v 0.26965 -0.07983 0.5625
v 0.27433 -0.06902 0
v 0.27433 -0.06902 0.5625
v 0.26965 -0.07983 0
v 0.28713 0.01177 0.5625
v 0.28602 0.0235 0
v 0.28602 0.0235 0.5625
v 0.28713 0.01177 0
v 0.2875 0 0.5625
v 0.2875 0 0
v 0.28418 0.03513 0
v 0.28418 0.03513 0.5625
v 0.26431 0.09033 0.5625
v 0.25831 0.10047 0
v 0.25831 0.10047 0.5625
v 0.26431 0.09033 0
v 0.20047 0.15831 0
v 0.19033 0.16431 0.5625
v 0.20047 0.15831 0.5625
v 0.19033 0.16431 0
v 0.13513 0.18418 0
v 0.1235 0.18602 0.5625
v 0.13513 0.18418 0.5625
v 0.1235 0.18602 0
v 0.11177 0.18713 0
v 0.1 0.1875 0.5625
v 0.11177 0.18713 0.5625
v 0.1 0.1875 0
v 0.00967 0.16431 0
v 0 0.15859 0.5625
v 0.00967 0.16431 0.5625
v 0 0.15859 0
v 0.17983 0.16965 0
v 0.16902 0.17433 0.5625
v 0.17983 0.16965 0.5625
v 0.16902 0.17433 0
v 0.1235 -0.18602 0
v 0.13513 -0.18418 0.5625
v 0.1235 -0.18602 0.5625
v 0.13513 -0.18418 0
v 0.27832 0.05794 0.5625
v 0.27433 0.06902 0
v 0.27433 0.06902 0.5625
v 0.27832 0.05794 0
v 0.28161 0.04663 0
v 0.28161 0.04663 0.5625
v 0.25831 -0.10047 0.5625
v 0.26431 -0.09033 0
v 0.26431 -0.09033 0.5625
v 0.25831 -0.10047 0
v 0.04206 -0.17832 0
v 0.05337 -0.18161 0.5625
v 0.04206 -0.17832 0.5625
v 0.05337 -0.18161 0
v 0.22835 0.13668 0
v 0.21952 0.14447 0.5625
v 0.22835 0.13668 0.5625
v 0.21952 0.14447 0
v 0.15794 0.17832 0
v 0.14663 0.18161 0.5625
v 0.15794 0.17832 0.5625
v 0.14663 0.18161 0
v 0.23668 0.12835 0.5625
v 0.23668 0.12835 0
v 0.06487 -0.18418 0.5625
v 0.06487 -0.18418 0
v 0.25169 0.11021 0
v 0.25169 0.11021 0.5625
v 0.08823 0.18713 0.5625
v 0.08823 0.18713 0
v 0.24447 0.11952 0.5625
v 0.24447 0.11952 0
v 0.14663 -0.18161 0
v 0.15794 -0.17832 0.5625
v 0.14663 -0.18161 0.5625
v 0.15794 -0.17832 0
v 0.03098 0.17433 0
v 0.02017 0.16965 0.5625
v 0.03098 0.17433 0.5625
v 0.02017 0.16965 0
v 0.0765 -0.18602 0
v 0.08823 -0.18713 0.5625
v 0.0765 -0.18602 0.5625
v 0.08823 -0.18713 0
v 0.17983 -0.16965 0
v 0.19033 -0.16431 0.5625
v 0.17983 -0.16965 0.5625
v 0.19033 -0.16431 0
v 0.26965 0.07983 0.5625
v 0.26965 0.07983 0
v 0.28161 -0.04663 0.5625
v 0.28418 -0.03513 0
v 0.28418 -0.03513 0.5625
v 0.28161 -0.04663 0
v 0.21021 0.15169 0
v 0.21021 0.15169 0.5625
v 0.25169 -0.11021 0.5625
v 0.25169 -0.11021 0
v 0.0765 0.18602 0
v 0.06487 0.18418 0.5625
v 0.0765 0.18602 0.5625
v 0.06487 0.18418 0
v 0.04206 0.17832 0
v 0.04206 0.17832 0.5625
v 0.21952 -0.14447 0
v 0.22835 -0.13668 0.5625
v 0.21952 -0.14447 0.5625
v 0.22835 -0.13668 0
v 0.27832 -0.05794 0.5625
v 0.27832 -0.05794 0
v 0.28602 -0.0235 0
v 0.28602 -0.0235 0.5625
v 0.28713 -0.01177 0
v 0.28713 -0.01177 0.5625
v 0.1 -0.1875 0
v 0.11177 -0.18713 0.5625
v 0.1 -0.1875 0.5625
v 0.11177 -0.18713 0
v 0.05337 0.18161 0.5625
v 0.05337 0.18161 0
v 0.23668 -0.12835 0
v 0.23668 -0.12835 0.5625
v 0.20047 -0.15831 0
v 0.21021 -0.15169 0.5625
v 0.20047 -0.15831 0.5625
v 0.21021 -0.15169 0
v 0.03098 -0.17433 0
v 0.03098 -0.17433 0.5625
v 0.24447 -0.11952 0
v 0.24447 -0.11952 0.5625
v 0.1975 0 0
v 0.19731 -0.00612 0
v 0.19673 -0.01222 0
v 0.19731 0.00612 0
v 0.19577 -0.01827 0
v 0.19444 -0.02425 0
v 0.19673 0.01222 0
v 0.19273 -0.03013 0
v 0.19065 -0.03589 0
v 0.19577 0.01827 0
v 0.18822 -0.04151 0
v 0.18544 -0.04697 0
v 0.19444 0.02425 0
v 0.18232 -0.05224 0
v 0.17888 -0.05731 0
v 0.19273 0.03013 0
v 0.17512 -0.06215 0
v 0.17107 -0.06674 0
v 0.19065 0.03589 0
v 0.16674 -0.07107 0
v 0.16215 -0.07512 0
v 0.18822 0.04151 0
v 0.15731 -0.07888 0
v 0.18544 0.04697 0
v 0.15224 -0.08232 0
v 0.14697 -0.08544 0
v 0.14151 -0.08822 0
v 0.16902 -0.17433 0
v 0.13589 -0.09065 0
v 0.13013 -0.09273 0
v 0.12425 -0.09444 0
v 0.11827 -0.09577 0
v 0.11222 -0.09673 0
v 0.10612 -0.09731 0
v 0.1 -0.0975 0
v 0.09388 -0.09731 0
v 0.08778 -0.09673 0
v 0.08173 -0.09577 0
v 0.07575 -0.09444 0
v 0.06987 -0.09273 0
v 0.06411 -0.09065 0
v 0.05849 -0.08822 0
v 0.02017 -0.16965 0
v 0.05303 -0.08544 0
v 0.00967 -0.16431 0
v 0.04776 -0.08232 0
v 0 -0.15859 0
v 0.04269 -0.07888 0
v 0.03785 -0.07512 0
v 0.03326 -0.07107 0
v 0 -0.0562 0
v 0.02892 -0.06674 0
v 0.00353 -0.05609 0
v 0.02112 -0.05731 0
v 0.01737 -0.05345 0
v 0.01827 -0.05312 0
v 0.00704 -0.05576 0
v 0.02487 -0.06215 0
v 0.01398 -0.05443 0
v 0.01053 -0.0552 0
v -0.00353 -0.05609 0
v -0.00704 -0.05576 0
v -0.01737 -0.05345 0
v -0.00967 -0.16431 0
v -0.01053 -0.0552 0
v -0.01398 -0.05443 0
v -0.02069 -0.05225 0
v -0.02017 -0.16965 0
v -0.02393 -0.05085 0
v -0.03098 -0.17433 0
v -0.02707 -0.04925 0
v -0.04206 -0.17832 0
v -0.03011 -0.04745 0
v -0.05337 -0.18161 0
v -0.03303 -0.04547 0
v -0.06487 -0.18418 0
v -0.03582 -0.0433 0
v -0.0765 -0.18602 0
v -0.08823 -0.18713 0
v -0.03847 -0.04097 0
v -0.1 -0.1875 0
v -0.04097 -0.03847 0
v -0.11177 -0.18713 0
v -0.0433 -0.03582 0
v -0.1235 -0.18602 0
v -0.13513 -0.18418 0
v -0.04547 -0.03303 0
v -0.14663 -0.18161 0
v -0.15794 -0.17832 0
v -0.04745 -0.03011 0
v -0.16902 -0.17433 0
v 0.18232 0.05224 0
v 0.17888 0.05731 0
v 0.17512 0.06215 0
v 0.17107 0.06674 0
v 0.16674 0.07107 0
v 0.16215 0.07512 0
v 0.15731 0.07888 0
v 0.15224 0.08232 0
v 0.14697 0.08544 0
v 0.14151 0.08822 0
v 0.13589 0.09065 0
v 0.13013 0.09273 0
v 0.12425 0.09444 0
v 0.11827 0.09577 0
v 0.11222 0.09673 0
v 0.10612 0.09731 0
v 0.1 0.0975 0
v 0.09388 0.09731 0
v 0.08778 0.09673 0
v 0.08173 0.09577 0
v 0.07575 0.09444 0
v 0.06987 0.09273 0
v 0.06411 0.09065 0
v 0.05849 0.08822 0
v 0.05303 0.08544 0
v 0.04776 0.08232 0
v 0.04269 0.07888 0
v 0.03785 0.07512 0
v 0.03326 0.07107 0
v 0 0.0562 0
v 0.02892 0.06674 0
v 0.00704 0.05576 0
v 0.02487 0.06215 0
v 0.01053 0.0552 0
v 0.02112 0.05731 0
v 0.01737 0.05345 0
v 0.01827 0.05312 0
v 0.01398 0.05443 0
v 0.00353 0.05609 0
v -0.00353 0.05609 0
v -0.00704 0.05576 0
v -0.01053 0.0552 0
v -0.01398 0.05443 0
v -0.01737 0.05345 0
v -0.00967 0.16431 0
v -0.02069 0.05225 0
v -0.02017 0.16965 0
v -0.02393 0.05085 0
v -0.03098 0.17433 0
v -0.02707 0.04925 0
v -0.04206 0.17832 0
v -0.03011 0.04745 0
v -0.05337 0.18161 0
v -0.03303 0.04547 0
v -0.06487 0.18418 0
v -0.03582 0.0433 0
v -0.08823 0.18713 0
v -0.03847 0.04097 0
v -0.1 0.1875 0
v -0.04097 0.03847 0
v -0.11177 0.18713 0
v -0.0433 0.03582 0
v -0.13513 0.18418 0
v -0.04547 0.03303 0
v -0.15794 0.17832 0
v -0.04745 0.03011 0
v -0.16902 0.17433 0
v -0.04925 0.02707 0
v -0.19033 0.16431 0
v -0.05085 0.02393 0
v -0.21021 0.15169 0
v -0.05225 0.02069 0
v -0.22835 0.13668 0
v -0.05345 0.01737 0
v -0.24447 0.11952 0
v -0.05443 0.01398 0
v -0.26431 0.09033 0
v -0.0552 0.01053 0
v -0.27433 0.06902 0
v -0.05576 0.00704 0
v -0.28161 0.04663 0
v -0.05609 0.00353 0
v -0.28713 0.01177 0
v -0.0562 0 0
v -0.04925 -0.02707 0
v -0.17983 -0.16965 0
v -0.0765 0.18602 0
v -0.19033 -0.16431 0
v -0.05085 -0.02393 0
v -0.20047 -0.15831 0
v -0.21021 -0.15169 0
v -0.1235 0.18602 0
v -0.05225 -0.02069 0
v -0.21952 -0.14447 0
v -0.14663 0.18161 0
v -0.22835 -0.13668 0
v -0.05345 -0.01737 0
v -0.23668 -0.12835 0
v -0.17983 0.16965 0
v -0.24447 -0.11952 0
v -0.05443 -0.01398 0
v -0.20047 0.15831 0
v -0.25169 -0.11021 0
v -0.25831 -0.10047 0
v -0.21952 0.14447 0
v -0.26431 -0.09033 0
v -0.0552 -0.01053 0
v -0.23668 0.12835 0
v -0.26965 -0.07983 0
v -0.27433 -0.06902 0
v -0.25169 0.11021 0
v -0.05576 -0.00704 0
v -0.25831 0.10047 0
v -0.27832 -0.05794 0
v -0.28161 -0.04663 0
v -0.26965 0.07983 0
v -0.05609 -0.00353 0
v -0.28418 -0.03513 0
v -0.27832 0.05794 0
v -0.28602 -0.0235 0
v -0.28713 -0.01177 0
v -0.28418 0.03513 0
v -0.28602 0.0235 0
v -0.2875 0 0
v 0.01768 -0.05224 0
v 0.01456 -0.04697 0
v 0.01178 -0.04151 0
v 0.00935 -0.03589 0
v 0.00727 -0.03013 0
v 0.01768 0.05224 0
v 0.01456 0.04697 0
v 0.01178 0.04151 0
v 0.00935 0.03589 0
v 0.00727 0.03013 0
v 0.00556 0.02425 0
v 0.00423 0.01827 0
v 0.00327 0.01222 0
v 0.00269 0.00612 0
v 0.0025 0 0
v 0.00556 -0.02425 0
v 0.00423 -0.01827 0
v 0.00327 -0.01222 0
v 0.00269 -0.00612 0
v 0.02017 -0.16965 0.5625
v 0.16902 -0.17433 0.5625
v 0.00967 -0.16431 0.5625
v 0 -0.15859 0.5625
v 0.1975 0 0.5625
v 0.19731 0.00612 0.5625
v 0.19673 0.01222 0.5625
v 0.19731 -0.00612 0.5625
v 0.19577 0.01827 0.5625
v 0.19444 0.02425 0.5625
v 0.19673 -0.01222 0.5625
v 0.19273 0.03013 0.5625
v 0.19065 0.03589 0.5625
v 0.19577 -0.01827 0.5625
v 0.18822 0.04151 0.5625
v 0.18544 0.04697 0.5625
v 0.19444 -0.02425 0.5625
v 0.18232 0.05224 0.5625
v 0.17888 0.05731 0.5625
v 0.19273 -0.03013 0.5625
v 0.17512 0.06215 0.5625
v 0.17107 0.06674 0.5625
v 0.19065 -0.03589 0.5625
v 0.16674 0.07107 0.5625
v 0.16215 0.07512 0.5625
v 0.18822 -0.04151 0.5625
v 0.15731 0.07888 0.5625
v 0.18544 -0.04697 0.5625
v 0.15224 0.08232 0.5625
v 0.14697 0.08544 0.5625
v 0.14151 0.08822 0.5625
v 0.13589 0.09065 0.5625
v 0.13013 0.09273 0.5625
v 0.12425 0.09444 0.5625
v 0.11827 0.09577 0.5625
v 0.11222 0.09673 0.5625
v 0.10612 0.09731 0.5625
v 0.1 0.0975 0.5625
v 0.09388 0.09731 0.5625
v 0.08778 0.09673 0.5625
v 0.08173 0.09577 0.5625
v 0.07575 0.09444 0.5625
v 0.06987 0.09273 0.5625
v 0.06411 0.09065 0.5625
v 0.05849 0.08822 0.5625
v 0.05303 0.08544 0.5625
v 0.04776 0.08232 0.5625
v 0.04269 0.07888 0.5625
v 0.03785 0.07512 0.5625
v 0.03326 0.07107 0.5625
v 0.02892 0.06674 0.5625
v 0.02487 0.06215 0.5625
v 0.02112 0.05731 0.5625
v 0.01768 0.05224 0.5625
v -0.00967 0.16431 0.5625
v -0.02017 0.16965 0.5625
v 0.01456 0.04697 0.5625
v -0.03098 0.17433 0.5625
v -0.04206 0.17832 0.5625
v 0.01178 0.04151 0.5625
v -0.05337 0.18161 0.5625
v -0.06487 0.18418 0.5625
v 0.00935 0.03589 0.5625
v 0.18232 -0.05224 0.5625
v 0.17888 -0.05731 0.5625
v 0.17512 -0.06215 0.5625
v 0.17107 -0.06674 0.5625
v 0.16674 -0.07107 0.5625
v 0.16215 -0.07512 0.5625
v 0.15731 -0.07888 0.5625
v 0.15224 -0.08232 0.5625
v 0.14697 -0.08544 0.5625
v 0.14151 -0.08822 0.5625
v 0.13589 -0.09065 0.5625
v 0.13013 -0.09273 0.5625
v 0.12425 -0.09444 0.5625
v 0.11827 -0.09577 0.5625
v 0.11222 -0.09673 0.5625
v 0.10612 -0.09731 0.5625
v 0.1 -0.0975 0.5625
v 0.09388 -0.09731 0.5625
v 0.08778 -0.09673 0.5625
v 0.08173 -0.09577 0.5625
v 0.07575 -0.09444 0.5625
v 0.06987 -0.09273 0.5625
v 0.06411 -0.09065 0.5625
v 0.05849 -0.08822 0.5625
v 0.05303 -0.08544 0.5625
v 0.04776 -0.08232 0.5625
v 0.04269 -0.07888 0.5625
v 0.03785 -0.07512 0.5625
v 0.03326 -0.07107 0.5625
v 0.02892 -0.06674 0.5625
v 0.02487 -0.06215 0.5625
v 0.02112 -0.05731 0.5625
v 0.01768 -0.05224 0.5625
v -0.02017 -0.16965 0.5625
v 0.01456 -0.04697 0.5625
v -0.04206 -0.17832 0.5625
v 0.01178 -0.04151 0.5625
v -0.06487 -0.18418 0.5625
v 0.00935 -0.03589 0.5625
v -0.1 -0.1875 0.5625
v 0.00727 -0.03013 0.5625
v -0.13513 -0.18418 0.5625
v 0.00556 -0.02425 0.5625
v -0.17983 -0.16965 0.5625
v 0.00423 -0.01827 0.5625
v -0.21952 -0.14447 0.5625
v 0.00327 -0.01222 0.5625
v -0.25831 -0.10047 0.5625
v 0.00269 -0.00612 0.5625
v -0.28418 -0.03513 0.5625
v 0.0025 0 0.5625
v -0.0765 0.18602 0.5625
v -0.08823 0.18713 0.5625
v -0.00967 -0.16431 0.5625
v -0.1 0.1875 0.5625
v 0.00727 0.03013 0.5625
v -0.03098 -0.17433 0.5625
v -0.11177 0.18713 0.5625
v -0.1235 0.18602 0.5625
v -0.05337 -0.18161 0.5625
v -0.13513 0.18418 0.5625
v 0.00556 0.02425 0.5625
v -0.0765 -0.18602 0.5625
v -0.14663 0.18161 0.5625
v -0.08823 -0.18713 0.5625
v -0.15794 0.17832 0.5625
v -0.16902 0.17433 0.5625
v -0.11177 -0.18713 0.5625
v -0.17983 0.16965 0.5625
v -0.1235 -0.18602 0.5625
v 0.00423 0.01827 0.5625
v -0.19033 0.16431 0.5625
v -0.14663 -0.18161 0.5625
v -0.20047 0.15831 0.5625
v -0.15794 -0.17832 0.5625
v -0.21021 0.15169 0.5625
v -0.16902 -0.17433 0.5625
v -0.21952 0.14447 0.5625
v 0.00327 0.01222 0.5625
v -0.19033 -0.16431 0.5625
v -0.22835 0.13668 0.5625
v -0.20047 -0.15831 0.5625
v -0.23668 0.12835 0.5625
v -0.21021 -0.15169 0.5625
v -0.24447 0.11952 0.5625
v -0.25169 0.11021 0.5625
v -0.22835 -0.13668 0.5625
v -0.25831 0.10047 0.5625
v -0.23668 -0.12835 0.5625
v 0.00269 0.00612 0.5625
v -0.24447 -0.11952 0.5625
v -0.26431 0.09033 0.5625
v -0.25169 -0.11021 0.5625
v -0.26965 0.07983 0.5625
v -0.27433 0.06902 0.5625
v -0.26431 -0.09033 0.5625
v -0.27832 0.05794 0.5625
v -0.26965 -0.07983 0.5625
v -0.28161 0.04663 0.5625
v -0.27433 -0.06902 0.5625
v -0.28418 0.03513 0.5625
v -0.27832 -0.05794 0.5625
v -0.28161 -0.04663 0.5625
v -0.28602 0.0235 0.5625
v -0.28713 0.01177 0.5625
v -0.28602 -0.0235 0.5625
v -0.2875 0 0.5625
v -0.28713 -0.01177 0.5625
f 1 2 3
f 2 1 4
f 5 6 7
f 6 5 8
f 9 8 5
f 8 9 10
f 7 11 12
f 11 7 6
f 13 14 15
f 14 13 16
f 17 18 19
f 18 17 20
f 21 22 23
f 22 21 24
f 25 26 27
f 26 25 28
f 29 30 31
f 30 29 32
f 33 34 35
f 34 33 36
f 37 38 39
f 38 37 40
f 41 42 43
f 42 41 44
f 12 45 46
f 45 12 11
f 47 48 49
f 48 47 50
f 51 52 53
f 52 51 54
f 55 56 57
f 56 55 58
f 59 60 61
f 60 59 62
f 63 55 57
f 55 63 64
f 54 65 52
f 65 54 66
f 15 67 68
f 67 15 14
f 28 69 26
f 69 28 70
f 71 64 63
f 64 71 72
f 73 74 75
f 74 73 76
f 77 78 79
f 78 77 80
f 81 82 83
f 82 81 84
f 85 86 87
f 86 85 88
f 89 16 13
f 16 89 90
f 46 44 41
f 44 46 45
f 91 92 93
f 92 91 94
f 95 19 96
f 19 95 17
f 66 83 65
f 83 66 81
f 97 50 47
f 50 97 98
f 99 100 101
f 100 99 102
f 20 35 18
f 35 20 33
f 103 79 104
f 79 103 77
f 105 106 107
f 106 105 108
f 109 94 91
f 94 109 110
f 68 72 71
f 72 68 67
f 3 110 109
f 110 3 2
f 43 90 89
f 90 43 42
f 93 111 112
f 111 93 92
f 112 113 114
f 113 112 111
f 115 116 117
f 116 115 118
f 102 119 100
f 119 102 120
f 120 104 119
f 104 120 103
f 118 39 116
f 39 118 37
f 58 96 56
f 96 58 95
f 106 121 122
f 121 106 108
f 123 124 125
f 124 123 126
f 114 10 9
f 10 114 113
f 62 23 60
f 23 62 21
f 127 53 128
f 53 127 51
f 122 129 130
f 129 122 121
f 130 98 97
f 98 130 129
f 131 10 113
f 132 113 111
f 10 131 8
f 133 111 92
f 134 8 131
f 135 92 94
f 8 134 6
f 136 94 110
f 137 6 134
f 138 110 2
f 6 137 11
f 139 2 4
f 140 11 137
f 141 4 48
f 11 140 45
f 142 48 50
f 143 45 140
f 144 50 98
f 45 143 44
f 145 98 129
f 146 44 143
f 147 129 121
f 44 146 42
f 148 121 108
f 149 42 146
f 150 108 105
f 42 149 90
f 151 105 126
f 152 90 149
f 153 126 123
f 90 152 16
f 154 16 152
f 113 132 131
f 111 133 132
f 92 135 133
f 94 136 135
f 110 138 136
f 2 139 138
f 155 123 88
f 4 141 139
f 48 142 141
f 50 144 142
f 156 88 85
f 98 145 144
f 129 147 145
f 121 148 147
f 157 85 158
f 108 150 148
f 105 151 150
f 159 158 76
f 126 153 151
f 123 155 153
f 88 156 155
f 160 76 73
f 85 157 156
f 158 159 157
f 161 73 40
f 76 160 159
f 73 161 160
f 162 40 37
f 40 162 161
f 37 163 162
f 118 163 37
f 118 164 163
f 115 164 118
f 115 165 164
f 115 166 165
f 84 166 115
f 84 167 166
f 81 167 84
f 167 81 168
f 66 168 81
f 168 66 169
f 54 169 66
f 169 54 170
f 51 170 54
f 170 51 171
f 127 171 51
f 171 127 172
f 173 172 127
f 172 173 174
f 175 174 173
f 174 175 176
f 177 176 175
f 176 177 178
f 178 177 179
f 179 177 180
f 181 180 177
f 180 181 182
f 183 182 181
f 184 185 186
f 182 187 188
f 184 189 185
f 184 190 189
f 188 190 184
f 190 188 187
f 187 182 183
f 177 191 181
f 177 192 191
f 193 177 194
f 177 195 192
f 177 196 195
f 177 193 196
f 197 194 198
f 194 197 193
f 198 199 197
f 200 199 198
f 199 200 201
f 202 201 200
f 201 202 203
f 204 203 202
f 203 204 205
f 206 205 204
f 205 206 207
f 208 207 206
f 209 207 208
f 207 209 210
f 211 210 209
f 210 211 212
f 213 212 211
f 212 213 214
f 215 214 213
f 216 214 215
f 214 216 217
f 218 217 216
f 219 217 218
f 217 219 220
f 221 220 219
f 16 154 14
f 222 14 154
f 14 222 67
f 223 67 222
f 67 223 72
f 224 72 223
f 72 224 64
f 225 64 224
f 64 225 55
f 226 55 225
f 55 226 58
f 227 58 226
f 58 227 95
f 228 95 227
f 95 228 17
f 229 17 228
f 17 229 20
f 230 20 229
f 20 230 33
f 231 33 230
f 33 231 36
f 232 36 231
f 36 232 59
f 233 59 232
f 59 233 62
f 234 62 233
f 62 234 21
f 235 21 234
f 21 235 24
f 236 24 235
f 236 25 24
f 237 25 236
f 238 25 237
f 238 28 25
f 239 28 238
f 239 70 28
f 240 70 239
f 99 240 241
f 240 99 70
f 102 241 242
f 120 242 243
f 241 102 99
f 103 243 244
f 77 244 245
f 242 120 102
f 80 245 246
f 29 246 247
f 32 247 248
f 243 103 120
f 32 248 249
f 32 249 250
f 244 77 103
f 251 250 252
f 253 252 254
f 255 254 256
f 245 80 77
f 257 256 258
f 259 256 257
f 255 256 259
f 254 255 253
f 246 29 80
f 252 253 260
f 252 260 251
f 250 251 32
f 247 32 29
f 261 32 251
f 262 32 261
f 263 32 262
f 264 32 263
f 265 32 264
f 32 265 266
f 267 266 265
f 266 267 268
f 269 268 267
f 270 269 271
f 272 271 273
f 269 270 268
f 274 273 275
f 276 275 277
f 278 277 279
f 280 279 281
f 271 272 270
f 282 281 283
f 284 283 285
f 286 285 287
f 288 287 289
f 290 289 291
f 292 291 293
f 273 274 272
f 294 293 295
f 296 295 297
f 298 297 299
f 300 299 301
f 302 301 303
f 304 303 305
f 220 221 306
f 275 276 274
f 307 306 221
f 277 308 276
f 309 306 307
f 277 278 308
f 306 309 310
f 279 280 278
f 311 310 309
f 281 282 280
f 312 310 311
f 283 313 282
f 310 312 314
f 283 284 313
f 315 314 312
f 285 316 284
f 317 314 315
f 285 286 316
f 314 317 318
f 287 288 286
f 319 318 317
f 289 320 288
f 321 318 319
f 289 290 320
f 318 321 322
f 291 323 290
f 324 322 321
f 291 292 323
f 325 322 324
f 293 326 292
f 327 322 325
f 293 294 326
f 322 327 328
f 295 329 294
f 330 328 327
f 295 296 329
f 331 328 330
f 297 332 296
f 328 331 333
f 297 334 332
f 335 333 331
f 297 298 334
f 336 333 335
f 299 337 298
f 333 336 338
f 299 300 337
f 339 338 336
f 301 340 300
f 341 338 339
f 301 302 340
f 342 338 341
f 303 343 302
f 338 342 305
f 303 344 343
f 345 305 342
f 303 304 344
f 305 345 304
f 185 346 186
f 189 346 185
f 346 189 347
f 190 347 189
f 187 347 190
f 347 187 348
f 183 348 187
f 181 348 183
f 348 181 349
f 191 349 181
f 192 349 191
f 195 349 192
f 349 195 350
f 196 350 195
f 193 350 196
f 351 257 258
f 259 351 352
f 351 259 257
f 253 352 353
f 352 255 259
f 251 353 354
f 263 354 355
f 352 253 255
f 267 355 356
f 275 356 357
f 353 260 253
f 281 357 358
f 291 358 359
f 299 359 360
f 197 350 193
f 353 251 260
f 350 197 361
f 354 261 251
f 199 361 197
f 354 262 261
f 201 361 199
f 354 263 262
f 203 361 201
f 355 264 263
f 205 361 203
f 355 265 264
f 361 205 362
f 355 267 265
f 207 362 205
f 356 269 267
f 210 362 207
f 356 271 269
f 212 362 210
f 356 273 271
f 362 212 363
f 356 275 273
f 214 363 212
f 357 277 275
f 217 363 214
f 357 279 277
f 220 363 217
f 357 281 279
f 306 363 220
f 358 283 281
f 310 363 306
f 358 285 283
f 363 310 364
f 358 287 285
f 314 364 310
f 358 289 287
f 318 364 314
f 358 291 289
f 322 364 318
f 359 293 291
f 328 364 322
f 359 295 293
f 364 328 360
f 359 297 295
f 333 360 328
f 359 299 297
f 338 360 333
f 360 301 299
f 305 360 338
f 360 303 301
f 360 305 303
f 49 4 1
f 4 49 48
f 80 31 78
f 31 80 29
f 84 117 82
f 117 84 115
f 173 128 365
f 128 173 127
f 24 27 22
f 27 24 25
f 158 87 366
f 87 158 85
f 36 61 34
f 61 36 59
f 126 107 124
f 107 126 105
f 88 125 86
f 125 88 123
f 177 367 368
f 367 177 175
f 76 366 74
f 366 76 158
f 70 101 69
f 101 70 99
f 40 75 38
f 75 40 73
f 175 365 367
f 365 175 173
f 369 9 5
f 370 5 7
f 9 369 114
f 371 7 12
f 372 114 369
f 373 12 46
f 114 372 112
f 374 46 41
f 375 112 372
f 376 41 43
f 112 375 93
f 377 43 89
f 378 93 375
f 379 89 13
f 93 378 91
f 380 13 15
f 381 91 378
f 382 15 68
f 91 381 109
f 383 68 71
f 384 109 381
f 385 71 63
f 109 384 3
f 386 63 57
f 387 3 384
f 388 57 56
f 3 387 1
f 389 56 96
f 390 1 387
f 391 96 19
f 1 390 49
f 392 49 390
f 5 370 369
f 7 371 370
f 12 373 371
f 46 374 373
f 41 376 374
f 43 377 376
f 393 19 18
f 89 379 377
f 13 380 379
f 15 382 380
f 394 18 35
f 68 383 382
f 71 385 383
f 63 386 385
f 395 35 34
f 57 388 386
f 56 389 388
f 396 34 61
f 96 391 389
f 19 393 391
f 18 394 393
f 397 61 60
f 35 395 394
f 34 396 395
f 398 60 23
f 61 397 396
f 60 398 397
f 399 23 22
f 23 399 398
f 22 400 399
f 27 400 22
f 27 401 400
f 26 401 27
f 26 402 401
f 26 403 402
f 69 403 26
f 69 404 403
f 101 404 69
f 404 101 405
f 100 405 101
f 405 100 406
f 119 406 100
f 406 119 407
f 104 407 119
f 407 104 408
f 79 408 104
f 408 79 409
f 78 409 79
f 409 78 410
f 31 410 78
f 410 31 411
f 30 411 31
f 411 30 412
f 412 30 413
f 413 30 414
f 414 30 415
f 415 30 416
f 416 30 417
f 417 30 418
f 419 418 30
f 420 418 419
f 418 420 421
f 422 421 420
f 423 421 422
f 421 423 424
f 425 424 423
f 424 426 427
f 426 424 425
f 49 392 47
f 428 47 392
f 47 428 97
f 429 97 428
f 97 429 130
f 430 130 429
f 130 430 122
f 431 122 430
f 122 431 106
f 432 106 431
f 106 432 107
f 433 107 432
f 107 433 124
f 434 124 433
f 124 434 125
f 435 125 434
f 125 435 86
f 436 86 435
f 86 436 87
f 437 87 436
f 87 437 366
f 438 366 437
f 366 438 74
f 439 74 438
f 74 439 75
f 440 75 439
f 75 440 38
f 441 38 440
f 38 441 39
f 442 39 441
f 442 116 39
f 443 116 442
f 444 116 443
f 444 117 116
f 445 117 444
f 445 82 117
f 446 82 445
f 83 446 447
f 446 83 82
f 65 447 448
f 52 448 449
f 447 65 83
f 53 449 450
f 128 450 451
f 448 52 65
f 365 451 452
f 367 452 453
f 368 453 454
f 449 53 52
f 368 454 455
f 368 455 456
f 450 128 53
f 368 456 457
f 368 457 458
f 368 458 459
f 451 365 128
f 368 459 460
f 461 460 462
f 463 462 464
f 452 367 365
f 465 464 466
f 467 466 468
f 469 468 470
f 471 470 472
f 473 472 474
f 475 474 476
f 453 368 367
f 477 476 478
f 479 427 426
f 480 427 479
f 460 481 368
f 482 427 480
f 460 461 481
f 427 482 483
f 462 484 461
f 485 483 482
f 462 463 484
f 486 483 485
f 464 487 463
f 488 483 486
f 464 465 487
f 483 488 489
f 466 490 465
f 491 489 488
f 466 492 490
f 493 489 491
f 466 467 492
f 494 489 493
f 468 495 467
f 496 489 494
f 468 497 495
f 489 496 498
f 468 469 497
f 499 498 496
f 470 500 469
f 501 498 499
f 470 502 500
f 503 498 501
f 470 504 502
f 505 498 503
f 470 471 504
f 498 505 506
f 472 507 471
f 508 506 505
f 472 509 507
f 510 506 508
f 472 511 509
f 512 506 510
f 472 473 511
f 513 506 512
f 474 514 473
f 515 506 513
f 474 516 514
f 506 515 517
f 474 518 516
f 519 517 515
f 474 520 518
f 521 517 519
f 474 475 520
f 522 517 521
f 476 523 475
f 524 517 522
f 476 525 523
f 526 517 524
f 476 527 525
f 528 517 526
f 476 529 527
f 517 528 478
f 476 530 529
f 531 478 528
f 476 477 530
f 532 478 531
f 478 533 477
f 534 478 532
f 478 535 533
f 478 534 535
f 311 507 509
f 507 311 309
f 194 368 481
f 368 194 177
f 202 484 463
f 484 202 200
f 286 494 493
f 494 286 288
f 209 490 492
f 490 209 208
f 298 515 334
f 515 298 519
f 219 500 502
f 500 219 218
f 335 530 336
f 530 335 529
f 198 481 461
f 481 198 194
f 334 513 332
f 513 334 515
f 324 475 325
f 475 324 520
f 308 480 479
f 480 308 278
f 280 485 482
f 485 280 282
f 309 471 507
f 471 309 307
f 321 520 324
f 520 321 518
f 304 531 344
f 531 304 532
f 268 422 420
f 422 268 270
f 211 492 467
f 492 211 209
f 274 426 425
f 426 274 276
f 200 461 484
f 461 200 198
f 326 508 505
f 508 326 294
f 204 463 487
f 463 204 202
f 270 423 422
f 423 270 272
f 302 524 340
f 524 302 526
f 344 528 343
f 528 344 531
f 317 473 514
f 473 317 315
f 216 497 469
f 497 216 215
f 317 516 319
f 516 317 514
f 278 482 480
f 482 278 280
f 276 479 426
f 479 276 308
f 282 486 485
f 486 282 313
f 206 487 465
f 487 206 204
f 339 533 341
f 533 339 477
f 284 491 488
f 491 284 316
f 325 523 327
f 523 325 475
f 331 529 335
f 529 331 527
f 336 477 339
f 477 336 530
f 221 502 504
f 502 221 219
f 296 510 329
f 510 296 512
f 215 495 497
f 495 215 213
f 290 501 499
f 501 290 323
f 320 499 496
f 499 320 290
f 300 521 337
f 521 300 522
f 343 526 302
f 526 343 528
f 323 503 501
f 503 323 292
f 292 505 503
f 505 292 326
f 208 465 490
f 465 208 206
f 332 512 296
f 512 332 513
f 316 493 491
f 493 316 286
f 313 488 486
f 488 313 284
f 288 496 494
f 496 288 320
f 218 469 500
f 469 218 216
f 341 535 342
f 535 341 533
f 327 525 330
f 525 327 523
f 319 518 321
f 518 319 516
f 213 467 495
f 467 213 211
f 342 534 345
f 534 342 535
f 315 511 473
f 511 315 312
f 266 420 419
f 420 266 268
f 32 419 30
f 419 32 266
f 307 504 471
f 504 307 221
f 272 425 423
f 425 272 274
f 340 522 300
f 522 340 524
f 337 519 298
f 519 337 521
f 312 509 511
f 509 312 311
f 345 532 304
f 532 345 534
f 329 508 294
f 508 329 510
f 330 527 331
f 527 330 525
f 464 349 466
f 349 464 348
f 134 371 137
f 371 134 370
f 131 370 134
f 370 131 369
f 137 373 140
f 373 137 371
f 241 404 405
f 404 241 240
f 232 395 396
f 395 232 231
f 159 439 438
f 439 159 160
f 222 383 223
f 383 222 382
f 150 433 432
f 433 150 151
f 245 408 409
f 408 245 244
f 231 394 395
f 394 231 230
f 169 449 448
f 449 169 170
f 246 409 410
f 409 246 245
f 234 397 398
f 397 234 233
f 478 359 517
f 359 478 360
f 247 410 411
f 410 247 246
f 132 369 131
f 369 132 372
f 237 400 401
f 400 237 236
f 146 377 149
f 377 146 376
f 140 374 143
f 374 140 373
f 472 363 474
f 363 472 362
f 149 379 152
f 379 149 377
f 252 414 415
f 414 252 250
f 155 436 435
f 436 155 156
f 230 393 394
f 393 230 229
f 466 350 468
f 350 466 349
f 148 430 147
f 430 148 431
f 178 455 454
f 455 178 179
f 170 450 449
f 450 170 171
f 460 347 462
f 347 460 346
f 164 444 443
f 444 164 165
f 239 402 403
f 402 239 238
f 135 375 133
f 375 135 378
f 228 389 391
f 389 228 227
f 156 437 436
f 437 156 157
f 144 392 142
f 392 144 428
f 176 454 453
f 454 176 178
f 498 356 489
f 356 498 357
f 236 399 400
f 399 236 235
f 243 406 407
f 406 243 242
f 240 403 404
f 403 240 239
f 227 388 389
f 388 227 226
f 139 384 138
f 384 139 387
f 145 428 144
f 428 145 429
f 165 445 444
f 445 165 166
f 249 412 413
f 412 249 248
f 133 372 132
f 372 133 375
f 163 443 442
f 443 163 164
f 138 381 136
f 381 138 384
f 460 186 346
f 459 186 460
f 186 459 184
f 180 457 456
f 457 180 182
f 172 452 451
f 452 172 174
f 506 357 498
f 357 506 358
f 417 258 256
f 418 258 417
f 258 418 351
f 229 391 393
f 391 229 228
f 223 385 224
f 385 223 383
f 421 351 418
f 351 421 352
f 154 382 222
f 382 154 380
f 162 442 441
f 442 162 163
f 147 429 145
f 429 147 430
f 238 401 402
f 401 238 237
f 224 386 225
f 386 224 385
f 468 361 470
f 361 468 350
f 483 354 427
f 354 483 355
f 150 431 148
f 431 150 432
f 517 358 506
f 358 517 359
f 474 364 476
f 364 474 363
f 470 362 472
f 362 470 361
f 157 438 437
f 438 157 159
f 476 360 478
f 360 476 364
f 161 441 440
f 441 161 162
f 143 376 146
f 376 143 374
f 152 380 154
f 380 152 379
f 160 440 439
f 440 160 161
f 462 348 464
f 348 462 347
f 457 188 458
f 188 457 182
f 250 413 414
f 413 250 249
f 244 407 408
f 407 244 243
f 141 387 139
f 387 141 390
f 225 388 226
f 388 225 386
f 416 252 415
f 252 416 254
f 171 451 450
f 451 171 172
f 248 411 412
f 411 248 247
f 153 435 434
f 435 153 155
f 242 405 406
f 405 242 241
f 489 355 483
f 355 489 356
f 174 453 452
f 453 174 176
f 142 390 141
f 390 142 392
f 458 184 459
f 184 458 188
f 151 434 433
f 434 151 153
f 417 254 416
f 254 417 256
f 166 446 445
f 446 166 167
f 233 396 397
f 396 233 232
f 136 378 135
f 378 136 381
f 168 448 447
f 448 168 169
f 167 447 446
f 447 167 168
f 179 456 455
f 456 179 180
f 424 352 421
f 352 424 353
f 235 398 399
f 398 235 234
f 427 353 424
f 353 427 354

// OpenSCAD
// Parametric Variables
shoulder_height = 0;       // Shared shoulder plane at z=0
cylinder_radius = 0.1875;  // Radius of both main cylinders
cylinder_height = 0.5625;  // Height of each cylinder from shoulder
cylinder_offset = 0.2;     // Lateral offset between cylinder centers
$fn = 100;                 // Smoothness for curved surfaces

// Positive side removal parameters
pos_hole1_radius = 0.0975;
pos_hole2_radius = 0.0534;
pos_reach = 0.9375;        // Reach from shoulder into positive side

// Negative side removal parameters
neg_central_radius = 0.0562;
neg_central_reach = 0.375; // Reach from shoulder into negative side
neg_annular1_inner = 0.0562;
neg_annular1_outer = 0.1162;
neg_annular2_inner = 0.0562;
neg_annular2_outer = 0.075;
neg_annular_depth = 0.0562; // Reach from shoulder into negative side

// Main body: Two overlapping cylinders from shoulder
module main_body() {
    // First cylinder
    translate([cylinder_offset/2, 0, shoulder_height])
        cylinder(h=cylinder_height, r=cylinder_radius);
    
    // Second cylinder (overlapping)
    translate([-cylinder_offset/2, 0, shoulder_height])
        cylinder(h=cylinder_height, r=cylinder_radius);
}

// Positive side cuts (from top, going down)
module positive_cuts() {
    // First hole (larger)
    translate([cylinder_offset/2, 0, shoulder_height + cylinder_height - pos_reach])
        cylinder(h=pos_reach, r=pos_hole1_radius);
    
    // Second hole (smaller)
    translate([cylinder_offset/2, 0, shoulder_height + cylinder_height - pos_reach])
        cylinder(h=pos_reach, r=pos_hole2_radius);
}

// Negative side cuts (from bottom, going up)
module negative_cuts() {
    // Central hole
    translate([0, 0, shoulder_height - neg_central_reach])
        cylinder(h=neg_central_reach, r=neg_central_radius);
    
    // First annular recess
    translate([0, 0, shoulder_height - neg_annular_depth])
        difference() {
            cylinder(h=neg_annular_depth, r=neg_annular1_outer);
            cylinder(h=neg_annular_depth, r=neg_annular1_inner);
        }
    
    // Second annular recess
    translate([0, 0, shoulder_height - neg_annular_depth])
        difference() {
            cylinder(h=neg_annular_depth, r=neg_annular2_outer);
            cylinder(h=neg_annular_depth, r=neg_annular2_inner);
        }
}

// Final model: Main body with all cuts removed
difference() {
    main_body();
    positive_cuts();
    negative_cuts();
}
